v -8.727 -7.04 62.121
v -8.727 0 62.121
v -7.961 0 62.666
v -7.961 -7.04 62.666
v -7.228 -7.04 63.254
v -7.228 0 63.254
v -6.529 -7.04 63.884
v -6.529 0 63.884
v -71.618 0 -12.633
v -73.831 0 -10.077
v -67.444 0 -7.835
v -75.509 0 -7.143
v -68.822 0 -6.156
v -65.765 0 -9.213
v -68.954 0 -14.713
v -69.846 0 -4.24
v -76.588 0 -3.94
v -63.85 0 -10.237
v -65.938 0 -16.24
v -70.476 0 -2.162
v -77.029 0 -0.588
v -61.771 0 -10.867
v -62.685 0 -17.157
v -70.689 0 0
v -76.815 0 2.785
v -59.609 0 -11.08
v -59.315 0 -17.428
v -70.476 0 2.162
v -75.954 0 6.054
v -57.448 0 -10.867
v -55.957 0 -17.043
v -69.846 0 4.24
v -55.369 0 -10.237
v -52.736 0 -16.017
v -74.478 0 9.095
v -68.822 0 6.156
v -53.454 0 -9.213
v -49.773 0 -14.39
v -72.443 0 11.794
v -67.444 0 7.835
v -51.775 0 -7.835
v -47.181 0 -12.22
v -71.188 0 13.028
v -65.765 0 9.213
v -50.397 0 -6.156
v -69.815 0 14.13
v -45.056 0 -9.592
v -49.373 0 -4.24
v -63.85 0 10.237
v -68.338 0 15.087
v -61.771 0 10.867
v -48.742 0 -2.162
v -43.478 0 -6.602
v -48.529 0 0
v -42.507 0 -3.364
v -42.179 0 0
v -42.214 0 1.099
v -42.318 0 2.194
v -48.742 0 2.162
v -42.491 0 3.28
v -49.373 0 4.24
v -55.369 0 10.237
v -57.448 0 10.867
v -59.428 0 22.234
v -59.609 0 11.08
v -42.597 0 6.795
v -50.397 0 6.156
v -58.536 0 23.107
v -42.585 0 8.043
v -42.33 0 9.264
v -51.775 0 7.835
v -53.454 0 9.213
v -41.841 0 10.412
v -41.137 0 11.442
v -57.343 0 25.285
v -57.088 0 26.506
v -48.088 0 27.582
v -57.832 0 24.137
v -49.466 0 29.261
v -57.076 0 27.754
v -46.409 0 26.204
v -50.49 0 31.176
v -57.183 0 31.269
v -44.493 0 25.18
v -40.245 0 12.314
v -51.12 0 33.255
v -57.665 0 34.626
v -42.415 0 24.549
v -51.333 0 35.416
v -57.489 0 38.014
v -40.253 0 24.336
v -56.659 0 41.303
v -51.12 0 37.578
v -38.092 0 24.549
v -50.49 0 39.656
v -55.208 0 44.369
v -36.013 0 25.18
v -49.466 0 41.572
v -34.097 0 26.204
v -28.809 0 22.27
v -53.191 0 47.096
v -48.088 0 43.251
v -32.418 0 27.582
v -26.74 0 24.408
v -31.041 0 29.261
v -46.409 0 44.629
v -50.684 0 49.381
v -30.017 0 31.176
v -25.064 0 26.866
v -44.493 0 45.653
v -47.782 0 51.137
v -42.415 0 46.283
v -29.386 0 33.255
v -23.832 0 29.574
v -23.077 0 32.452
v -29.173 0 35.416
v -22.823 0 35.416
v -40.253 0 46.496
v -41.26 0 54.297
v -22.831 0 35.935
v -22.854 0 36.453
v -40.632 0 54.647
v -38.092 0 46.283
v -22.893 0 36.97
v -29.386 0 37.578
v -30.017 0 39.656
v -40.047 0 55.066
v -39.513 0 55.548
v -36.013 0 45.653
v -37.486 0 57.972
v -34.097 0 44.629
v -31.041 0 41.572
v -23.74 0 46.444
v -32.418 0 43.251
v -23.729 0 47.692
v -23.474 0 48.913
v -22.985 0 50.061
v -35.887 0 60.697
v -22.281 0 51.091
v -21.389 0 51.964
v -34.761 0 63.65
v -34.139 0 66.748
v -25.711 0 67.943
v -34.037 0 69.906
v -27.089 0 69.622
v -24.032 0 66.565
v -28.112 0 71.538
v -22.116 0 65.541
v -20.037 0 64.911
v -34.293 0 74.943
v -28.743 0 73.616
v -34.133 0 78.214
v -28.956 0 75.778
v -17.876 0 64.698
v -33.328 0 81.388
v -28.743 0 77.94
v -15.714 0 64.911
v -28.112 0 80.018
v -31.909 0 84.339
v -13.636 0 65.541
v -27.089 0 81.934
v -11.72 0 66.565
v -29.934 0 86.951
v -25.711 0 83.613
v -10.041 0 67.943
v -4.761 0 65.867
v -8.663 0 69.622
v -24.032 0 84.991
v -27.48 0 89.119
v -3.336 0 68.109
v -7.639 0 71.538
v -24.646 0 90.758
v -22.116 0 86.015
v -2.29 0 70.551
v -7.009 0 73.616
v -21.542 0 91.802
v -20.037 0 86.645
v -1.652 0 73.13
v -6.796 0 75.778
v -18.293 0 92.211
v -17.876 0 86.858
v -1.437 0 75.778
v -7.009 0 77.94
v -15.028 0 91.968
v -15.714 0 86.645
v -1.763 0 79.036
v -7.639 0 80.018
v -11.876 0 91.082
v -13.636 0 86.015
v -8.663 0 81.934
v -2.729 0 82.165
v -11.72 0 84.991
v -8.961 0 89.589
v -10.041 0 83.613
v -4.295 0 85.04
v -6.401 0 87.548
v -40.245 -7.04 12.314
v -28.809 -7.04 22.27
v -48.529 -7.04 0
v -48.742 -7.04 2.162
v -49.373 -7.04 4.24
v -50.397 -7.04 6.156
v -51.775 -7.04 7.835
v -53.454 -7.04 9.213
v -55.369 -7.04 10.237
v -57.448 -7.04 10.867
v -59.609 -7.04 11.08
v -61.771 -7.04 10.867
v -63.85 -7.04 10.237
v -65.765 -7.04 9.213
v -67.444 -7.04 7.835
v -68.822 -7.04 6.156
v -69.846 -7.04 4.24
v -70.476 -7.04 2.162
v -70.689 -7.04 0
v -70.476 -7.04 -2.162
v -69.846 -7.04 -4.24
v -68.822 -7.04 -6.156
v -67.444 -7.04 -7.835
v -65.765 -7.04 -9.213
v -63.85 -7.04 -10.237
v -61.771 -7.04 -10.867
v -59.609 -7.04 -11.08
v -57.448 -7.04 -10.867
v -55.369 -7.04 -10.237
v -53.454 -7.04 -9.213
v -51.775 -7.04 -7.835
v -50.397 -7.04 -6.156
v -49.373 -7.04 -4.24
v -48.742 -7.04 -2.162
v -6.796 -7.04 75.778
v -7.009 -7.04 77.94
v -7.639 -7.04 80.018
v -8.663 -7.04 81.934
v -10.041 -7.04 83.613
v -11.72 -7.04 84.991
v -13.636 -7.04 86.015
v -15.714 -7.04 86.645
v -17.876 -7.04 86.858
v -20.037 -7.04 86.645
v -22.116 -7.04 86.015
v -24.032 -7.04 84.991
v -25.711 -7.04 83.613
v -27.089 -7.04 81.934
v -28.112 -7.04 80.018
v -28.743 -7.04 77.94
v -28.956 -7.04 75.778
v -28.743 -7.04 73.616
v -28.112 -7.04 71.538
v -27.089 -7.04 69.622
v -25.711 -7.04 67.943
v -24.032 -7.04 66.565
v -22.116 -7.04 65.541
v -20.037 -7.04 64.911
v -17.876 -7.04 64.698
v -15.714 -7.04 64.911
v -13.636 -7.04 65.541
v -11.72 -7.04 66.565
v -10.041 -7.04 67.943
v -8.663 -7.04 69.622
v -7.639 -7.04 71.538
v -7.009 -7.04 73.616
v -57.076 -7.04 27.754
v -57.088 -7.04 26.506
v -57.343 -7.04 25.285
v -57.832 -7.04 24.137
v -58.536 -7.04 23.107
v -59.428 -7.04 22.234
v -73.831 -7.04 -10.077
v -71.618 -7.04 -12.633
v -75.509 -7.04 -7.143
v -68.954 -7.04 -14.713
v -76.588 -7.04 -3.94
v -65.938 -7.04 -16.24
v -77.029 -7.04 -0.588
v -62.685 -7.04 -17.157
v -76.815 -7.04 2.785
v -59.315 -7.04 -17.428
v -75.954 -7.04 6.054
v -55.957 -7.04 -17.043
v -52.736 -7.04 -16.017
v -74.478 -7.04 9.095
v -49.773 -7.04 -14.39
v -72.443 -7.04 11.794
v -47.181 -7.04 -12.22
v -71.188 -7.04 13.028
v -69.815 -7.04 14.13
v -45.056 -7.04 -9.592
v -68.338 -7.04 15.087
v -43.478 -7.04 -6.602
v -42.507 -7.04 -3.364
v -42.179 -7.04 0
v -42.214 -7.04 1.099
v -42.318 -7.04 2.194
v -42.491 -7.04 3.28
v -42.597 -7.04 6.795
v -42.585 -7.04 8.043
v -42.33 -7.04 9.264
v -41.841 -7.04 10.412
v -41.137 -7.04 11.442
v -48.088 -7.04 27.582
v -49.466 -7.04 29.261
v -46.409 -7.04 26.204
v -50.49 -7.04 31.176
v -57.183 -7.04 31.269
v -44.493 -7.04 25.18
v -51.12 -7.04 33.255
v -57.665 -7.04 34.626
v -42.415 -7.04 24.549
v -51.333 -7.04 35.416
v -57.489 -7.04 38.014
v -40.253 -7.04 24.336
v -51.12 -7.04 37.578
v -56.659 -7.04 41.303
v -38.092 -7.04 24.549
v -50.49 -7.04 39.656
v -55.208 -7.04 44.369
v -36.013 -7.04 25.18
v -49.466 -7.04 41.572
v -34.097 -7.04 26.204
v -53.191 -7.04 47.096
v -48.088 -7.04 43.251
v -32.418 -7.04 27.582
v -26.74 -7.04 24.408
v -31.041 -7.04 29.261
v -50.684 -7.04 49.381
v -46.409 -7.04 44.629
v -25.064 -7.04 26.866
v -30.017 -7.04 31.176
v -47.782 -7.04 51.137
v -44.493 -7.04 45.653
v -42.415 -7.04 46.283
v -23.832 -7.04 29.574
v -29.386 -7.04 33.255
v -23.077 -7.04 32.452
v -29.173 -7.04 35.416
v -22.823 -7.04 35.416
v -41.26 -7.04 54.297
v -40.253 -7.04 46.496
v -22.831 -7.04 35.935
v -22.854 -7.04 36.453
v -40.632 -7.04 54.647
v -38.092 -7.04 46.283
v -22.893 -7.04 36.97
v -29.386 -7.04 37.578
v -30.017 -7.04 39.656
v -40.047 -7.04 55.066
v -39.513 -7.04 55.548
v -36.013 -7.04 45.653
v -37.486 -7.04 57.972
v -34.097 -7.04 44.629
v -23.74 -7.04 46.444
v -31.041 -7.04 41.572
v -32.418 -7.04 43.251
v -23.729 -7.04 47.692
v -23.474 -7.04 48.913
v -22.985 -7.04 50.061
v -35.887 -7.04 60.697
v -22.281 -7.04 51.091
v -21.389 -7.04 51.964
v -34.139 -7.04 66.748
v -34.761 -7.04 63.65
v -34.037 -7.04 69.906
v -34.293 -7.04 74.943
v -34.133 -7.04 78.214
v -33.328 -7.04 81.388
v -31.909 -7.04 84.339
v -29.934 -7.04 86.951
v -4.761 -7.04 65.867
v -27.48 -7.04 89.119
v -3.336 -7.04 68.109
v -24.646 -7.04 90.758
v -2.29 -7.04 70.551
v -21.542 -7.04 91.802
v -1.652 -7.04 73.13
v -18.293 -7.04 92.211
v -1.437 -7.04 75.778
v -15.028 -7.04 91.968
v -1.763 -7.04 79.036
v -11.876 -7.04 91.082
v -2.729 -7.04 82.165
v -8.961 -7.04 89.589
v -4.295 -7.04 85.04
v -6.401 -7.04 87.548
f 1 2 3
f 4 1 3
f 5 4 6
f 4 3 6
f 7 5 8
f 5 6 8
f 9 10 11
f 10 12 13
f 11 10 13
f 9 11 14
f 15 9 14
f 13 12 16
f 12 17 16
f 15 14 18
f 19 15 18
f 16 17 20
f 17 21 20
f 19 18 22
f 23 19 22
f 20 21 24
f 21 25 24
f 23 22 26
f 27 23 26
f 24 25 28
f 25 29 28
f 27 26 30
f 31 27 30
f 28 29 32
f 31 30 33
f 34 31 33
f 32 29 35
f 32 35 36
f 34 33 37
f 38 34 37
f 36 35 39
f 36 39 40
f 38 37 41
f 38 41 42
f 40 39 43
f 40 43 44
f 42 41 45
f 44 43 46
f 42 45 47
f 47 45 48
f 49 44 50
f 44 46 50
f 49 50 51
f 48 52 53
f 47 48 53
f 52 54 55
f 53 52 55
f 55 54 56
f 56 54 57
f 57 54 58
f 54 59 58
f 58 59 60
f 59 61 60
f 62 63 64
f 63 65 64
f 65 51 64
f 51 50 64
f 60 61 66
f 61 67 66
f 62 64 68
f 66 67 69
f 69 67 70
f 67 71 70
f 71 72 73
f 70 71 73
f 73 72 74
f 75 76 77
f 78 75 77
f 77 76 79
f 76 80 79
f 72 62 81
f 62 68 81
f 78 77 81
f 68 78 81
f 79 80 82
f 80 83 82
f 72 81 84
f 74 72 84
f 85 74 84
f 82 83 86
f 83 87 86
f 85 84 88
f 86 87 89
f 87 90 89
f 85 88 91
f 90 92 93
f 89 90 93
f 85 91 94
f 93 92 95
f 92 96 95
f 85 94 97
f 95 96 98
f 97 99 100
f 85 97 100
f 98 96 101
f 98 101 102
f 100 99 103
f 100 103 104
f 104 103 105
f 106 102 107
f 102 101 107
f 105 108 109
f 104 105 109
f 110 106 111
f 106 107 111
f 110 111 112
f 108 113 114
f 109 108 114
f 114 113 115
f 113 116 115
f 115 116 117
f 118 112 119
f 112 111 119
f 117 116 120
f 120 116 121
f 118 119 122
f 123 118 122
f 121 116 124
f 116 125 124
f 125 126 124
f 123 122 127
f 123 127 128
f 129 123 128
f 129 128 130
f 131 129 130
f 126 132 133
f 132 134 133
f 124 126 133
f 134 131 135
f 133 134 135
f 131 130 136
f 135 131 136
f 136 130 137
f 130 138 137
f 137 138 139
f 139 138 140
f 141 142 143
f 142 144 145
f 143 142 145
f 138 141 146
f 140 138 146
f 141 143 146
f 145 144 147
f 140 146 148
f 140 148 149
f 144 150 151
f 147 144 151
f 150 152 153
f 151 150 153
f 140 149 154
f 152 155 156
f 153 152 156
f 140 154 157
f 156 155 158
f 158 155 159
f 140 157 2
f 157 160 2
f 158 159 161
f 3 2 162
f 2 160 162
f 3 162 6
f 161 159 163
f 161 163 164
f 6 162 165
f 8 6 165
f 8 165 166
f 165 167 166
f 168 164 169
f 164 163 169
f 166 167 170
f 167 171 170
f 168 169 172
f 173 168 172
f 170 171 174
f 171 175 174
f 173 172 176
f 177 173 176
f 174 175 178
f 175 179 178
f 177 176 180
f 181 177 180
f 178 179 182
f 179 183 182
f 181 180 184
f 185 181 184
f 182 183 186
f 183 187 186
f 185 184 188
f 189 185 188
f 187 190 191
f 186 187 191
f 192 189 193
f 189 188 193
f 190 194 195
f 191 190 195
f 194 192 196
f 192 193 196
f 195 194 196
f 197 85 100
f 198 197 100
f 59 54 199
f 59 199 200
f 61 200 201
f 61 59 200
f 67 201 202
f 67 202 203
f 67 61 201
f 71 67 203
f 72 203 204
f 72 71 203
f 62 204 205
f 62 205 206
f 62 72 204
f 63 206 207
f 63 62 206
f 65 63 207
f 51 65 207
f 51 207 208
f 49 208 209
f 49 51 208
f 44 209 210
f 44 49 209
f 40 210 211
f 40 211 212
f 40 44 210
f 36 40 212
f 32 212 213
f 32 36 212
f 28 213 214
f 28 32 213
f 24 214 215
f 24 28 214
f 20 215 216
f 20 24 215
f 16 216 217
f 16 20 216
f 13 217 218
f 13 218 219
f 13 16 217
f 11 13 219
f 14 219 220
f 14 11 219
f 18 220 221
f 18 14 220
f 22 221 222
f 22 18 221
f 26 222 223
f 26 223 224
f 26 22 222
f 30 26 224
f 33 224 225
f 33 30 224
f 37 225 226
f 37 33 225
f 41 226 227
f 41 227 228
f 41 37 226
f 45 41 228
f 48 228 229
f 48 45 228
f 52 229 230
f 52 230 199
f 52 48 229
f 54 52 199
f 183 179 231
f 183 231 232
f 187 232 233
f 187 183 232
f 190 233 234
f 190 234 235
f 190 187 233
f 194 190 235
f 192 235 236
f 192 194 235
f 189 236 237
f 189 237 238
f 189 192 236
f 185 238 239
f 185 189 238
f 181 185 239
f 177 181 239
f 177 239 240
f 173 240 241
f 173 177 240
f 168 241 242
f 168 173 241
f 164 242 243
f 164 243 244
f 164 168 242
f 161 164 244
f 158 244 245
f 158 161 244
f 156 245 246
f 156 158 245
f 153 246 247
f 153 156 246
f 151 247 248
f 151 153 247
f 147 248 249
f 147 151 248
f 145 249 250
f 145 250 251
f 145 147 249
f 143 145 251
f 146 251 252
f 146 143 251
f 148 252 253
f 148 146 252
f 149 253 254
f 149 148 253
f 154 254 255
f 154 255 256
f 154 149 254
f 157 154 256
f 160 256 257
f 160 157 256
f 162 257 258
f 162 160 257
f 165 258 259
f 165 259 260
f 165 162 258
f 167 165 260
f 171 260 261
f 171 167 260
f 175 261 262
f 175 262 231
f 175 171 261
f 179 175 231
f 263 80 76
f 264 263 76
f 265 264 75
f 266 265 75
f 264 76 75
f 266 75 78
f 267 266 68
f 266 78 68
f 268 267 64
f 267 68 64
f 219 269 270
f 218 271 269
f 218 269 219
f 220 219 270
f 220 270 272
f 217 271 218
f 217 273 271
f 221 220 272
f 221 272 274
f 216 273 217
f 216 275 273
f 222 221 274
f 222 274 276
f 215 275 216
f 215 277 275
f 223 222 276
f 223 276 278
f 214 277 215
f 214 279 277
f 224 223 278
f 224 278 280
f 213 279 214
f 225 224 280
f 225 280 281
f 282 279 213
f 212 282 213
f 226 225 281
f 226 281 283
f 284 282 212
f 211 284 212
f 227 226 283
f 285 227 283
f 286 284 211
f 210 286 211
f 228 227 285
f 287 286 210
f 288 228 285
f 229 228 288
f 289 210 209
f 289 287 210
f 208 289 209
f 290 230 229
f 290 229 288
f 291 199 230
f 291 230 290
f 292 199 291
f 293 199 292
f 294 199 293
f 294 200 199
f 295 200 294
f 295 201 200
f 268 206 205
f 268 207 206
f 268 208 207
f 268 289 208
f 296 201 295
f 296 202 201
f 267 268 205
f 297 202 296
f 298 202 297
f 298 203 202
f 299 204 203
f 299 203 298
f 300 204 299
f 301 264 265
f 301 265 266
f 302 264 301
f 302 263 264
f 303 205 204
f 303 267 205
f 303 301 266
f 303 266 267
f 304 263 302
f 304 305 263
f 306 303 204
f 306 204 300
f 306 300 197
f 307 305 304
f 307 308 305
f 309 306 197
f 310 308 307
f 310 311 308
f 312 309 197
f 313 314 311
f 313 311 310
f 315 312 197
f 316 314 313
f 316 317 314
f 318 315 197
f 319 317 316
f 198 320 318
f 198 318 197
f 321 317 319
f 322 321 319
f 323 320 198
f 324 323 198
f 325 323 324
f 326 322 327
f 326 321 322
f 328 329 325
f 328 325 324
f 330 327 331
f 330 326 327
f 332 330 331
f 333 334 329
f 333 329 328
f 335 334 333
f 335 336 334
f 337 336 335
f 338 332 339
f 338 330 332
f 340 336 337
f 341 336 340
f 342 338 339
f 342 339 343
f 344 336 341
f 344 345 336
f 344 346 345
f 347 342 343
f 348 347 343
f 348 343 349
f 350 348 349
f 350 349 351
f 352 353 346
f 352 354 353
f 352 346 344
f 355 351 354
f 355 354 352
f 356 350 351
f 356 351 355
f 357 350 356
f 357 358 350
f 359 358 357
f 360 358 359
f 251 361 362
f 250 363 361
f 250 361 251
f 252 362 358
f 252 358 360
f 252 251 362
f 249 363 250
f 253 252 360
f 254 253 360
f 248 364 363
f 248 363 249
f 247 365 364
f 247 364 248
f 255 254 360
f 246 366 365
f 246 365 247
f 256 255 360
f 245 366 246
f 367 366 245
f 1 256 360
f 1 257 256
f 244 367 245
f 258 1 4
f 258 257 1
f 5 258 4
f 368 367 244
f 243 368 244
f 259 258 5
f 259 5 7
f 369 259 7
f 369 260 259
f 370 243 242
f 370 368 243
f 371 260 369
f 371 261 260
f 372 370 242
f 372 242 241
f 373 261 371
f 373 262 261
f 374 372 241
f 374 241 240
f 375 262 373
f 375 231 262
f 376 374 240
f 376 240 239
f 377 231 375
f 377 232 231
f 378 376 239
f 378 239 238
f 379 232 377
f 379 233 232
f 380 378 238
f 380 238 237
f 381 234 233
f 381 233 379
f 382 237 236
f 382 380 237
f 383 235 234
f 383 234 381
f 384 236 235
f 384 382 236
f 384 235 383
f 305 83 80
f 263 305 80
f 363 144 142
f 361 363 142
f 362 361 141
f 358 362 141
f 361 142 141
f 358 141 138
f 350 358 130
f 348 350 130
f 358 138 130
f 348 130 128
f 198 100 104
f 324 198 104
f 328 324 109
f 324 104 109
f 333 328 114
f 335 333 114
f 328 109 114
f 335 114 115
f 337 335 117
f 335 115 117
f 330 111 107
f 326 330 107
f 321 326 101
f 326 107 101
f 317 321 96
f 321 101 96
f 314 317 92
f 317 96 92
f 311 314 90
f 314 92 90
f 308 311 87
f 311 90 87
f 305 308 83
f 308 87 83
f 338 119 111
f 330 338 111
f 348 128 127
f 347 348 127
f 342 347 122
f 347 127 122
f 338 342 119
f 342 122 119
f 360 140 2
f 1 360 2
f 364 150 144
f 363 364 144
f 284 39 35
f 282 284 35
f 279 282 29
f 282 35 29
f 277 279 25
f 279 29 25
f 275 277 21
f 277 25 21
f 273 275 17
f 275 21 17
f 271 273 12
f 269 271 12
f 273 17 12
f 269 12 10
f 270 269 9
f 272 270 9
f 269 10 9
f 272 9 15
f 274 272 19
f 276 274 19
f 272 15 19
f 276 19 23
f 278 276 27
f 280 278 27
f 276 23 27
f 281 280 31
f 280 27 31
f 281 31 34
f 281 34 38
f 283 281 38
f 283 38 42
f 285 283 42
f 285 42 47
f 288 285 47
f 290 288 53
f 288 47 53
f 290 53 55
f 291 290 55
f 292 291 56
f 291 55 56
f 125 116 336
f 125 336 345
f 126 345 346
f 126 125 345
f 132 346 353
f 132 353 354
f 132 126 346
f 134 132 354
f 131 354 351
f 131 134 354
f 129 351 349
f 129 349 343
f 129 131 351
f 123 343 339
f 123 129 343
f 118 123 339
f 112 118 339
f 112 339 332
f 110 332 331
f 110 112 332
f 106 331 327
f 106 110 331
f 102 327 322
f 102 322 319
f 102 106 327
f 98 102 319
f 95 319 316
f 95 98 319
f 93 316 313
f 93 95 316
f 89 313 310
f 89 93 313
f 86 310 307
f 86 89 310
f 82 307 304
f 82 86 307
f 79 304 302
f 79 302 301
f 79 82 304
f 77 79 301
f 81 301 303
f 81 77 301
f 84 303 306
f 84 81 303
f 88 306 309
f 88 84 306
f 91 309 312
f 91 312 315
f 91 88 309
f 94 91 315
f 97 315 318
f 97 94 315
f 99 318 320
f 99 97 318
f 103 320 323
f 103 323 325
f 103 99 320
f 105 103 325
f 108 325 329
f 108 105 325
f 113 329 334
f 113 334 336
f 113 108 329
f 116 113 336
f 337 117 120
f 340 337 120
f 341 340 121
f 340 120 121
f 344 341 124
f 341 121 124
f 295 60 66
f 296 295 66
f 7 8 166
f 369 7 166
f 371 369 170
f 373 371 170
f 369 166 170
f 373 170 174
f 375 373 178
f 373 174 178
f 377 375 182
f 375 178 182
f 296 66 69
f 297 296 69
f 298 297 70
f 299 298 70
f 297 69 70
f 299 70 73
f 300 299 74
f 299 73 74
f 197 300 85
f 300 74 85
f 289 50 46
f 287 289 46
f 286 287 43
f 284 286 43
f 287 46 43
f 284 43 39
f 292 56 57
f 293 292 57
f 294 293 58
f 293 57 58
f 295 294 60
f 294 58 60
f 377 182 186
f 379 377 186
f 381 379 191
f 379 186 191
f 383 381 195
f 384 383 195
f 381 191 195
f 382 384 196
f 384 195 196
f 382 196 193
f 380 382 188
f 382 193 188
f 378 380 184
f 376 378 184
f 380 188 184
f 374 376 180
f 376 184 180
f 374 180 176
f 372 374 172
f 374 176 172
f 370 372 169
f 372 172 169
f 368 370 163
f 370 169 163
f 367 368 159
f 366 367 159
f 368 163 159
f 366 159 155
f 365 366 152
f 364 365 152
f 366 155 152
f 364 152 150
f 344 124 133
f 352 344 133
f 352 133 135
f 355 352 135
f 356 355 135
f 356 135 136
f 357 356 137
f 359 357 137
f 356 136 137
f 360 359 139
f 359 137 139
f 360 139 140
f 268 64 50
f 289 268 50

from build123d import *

# Parameters (mm, degrees)
F0_R     = 11.079999938
F1_DEPTH = 7.04


with BuildPart() as f1:
    # F0 (on Front) → F1 (new body)
    with BuildSketch(Plane.XZ):
        with BuildLine():
            ThreePointArc((-28.8090031659, 22.2696470138), (-24.3900840083, 28.1937049584), (-22.8232076674, 35.4163227376))
            ThreePointArc((-22.8232076674, 35.4163227376), (-22.8405604112, 36.1938930103), (-22.8925840909, 36.9699150355))
            ThreePointArc((-22.8925840909, 36.9699150355), (-31.6310611427, 50.5643750287), (-47.7816925034, 51.1365903237))
            ThreePointArc((-47.7816925034, 51.1365903237), (-56.0085206864, 42.8711874283), (-57.1825180023, 31.2686309308))
            ThreePointArc((-57.1825180023, 31.2686309308), (-45.5226501495, 18.8019352041), (-28.8090031659, 22.2696470138))
        make_face()
        with Locations((-40.2532076054, 35.4163227376)):
            Circle(F0_R, mode=Mode.SUBTRACT)
        with BuildLine():
            ThreePointArc((-47.7816925034, 51.1365903237), (-31.6310611427, 50.5643750287), (-22.8925840909, 36.9699150355))
            Line((-22.8925840909, 36.9699150355), (-23.7404485644, 46.4443800767))
            ThreePointArc((-23.7404485644, 46.4443800767), (-23.2576465121, 49.4992381724), (-21.3890303605, 51.963691354))
            Line((-21.3890303605, 51.963691354), (-8.7265202555, 62.1209370132))
            ThreePointArc((-8.7265202555, 62.1209370132), (-25.2452652126, 61.0838938149), (-34.2931167989, 74.9432146938))
            Line((-34.2931167989, 74.9432146938), (-34.0369961774, 69.9059709762))
            ThreePointArc((-34.0369961774, 69.9059709762), (-35.2629924551, 62.1501768677), (-39.5130267128, 55.5477062744))
            ThreePointArc((-39.5130267128, 55.5477062744), (-40.3333403908, 54.8479164985), (-41.2602253247, 54.297004001))
            Line((-41.2602253247, 54.297004001), (-47.7816925034, 51.1365903237))
        make_face()
        with BuildLine():
            Line((-40.245373005, 12.314266868), (-28.8090031659, 22.2696470138))
            ThreePointArc((-28.8090031659, 22.2696470138), (-45.5226501495, 18.8019352041), (-57.1825180023, 31.2686309308))
            Line((-57.1825180023, 31.2686309308), (-57.0764976956, 27.7535374878))
            ThreePointArc((-57.0764976956, 27.7535374878), (-57.5592997479, 24.6986793921), (-59.4279158995, 22.2342262105))
            Line((-59.4279158995, 22.2342262105), (-68.3381404853, 15.0868802857))
            ThreePointArc((-68.3381404853, 15.0868802857), (-52.3672326621, 15.8542087629), (-42.4907709022, 3.2798621477))
            Line((-42.4907709022, 3.2798621477), (-42.5967912088, 6.7949555907))
            ThreePointArc((-42.5967912088, 6.7949555907), (-42.1139891566, 9.8498136864), (-40.245373005, 12.314266868))
        make_face()
        with BuildLine():
            Line((-6.5290846743, 63.8836122516), (-8.7265202555, 62.1209370132))
            ThreePointArc((-8.7265202555, 62.1209370132), (-7.5899744525, 62.955116416), (-6.5290846743, 63.8836122516))
        make_face()
        with BuildLine():
            ThreePointArc((-34.2931167989, 74.9432146938), (-25.2452652126, 61.0838938149), (-8.7265202555, 62.1209370132))
            Line((-8.7265202555, 62.1209370132), (-6.5290846743, 63.8836122516))
            ThreePointArc((-6.5290846743, 63.8836122516), (-2.7637901739, 69.3087740166), (-1.4373358773, 75.777958034))
            ThreePointArc((-1.4373358773, 75.777958034), (-18.2933365525, 92.2111495713), (-34.2931167989, 74.9432146938))
        make_face()
        with Locations((-17.8758302018, 75.777958034)):
            Circle(F0_R, mode=Mode.SUBTRACT)
        with BuildLine():
            ThreePointArc((-42.1793983078, 0), (-42.2574160625, 1.6473045105), (-42.4907709022, 3.2798621477))
            ThreePointArc((-42.4907709022, 3.2798621477), (-52.3672326621, 15.8542087629), (-68.3381404853, 15.0868802857))
            Line((-68.3381404853, 15.0868802857), (-72.4431903423, 11.7940102706))
            ThreePointArc((-72.4431903423, 11.7940102706), (-65.9383753509, -16.2403493387), (-42.1793983078, 0))
        make_face()
        with Locations((-59.6093982458, 0)):
            Circle(F0_R, mode=Mode.SUBTRACT)
        with BuildLine():
            Line((-72.4431903423, 11.7940102706), (-68.3381404853, 15.0868802857))
            ThreePointArc((-68.3381404853, 15.0868802857), (-70.5156565401, 13.5962652172), (-72.4431903423, 11.7940102706))
        make_face()
    extrude(amount=F1_DEPTH)


solid = f1.part
